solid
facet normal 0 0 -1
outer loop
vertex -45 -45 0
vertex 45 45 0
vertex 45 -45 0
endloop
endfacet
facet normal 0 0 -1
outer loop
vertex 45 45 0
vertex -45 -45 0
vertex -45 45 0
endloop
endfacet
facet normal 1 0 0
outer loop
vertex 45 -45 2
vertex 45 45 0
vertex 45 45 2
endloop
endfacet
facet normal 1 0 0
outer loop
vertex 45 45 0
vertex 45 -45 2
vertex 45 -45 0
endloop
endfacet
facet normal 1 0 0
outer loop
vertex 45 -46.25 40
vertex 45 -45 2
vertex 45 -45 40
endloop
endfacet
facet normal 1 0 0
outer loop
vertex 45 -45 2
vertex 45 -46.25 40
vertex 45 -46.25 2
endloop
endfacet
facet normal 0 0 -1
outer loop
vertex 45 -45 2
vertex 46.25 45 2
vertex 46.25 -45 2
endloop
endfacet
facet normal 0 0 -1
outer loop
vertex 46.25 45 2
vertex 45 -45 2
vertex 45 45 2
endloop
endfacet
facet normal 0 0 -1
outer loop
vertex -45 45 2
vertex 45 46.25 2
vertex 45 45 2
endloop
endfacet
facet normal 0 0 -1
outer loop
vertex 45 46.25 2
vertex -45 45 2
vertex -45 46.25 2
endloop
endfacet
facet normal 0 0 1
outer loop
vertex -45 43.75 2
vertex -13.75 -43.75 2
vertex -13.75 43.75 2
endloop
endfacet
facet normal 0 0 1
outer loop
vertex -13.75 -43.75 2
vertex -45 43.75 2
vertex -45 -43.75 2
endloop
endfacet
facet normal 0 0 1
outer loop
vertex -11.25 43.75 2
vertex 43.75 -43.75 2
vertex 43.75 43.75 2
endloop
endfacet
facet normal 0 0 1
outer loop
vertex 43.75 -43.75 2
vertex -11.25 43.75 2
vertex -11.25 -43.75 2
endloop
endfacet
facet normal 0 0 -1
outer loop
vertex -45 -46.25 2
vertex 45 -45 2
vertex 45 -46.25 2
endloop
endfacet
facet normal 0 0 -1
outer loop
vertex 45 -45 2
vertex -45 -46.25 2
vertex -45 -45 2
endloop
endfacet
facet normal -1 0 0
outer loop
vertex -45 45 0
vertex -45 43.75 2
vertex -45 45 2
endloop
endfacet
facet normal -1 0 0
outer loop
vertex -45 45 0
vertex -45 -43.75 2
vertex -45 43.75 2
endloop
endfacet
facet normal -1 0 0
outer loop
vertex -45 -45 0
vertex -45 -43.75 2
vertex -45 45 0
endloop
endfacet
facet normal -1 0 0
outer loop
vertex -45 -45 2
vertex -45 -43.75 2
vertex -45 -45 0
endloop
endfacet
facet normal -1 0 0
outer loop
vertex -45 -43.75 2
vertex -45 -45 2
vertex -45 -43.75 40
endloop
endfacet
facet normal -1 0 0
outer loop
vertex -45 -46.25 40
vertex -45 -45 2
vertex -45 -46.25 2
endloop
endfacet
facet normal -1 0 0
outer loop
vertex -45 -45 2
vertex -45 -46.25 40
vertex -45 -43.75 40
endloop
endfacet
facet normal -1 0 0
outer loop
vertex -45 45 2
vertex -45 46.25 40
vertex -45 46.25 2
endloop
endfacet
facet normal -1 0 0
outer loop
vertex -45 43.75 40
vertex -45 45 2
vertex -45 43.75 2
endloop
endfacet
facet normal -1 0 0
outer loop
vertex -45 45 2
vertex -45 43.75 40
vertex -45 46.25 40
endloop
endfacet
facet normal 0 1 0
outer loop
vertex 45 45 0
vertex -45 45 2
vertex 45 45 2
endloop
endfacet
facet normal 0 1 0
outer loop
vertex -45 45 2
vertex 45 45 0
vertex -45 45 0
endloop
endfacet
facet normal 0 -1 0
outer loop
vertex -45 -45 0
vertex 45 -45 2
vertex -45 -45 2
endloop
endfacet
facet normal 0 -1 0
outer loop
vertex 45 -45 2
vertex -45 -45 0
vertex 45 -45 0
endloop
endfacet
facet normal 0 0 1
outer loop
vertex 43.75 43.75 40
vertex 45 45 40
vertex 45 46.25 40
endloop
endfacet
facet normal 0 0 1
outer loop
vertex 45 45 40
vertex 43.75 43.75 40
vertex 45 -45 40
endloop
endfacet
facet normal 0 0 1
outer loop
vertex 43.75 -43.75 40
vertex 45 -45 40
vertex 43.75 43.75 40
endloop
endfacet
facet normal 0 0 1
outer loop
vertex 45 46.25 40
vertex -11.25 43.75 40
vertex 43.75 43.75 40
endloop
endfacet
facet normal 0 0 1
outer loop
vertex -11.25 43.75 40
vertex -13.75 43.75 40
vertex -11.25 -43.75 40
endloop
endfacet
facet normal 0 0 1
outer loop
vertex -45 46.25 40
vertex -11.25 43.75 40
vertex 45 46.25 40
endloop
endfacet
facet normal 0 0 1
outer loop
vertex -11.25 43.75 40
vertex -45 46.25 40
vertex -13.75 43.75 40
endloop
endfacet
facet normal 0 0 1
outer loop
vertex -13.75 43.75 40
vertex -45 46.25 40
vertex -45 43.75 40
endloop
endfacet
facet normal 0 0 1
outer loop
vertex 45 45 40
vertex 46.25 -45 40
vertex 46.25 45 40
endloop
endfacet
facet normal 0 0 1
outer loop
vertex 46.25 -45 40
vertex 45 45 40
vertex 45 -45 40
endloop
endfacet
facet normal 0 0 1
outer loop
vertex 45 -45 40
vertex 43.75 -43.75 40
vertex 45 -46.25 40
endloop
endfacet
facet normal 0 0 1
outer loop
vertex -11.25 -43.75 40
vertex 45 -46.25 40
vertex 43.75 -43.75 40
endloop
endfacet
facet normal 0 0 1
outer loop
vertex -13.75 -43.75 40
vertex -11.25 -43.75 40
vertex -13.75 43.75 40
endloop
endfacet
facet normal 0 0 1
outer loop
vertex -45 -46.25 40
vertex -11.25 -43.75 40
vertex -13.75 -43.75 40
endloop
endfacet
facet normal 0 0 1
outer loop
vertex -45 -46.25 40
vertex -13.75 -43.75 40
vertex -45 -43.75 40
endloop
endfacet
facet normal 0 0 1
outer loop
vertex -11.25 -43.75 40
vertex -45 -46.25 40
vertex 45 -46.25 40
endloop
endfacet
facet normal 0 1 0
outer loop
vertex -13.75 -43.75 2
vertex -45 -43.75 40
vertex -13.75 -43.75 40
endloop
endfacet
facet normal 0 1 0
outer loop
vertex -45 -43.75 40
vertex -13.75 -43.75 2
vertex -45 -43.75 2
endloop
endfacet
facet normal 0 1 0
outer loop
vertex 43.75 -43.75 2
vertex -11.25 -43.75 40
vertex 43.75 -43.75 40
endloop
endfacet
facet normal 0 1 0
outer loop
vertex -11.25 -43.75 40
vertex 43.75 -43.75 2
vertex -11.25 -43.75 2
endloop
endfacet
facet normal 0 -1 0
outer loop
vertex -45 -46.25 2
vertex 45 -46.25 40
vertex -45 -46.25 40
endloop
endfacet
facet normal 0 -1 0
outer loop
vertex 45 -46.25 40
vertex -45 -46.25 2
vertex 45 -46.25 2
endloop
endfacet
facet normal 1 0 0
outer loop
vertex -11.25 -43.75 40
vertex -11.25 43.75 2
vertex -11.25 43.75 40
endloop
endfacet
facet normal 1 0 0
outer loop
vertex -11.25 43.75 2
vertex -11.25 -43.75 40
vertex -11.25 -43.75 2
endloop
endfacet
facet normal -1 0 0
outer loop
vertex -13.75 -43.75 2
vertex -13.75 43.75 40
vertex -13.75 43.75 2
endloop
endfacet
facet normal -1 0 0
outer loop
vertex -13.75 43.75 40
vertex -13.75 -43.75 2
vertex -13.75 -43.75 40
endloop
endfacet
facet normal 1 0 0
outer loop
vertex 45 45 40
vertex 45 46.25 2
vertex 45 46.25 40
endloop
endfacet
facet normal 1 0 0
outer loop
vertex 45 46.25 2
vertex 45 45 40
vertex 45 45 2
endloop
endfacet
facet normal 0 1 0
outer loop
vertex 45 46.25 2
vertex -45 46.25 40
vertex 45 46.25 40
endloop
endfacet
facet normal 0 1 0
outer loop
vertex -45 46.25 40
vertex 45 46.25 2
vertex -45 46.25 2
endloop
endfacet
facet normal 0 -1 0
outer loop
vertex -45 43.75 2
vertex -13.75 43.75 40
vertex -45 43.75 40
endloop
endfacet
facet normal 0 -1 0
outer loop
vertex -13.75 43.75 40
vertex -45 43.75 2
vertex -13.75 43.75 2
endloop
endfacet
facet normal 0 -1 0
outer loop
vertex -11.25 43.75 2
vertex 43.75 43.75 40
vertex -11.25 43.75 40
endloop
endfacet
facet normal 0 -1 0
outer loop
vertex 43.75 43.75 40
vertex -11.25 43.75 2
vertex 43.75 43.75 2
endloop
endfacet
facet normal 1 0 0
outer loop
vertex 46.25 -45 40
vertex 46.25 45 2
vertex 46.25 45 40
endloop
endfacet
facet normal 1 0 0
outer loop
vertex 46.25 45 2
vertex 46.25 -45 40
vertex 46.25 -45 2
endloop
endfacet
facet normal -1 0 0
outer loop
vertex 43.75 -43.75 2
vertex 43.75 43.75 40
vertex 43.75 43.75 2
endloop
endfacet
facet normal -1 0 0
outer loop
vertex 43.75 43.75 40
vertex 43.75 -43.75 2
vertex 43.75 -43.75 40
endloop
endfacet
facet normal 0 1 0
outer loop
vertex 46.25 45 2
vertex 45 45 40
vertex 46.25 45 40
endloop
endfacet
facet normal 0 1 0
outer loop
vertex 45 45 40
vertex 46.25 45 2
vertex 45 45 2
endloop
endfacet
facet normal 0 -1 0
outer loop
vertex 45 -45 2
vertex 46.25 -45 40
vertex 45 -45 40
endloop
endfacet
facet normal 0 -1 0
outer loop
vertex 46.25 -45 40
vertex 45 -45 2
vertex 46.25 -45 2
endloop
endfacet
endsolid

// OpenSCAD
// Built by bench/smallmodels/features/compiler.py from a list of features.
$fn = 64;
difference() {
  union() {
    translate([0, 0, 0]) translate([-45, -45, 0]) cube([90, 90, 2]);
  }
  union() {
    translate([-20.7, -20.7, -2]) rotate([0, 0, 0]) translate([-35.75, -35.75, 0]) cube([71.5, 71.5, 2]);
    translate([-6.9, -20.7, -2]) rotate([0, 0, 0]) translate([-35.75, -35.75, 0]) cube([71.5, 71.5, 2]);
    translate([6.9, -20.7, -2]) rotate([0, 0, 0]) translate([-35.75, -35.75, 0]) cube([71.5, 71.5, 2]);
    translate([20.7, -20.7, -2]) rotate([0, 0, 0]) translate([-35.75, -35.75, 0]) cube([71.5, 71.5, 2]);
    translate([-20.7, -6.9, -2]) rotate([0, 0, 0]) translate([-35.75, -35.75, 0]) cube([71.5, 71.5, 2]);
    translate([-6.9, -6.9, -2]) rotate([0, 0, 0]) translate([-35.75, -35.75, 0]) cube([71.5, 71.5, 2]);
    translate([6.9, -6.9, -2]) rotate([0, 0, 0]) translate([-35.75, -35.75, 0]) cube([71.5, 71.5, 2]);
    translate([20.7, -6.9, -2]) rotate([0, 0, 0]) translate([-35.75, -35.75, 0]) cube([71.5, 71.5, 2]);
    translate([-20.7, 6.9, -2]) rotate([0, 0, 0]) translate([-35.75, -35.75, 0]) cube([71.5, 71.5, 2]);
    translate([-6.9, 6.9, -2]) rotate([0, 0, 0]) translate([-35.75, -35.75, 0]) cube([71.5, 71.5, 2]);
    translate([6.9, 6.9, -2]) rotate([0, 0, 0]) translate([-35.75, -35.75, 0]) cube([71.5, 71.5, 2]);
    translate([20.7, 6.9, -2]) rotate([0, 0, 0]) translate([-35.75, -35.75, 0]) cube([71.5, 71.5, 2]);
    translate([-20.7, 20.7, -2]) rotate([0, 0, 0]) translate([-35.75, -35.75, 0]) cube([71.5, 71.5, 2]);
    translate([-6.9, 20.7, -2]) rotate([0, 0, 0]) translate([-35.75, -35.75, 0]) cube([71.5, 71.5, 2]);
    translate([6.9, 20.7, -2]) rotate([0, 0, 0]) translate([-35.75, -35.75, 0]) cube([71.5, 71.5, 2]);
    translate([20.7, 20.7, -2]) rotate([0, 0, 0]) translate([-35.75, -35.75, 0]) cube([71.5, 71.5, 2]);
  }
}
union() {
    translate([0, -45, 2]) translate([-45, -1.25, 0]) cube([90, 2.5, 38]);
  }
union() {
    translate([-12.5, 0, 2]) translate([-1.25, -45, 0]) cube([2.5, 90, 38]);
  }
union() {
    translate([0, 45, 2]) translate([-45, -1.25, 0]) cube([90, 2.5, 38]);
  }
union() {
    translate([45, 0, 2]) translate([-1.25, -45, 0]) cube([2.5, 90, 38]);
  }
